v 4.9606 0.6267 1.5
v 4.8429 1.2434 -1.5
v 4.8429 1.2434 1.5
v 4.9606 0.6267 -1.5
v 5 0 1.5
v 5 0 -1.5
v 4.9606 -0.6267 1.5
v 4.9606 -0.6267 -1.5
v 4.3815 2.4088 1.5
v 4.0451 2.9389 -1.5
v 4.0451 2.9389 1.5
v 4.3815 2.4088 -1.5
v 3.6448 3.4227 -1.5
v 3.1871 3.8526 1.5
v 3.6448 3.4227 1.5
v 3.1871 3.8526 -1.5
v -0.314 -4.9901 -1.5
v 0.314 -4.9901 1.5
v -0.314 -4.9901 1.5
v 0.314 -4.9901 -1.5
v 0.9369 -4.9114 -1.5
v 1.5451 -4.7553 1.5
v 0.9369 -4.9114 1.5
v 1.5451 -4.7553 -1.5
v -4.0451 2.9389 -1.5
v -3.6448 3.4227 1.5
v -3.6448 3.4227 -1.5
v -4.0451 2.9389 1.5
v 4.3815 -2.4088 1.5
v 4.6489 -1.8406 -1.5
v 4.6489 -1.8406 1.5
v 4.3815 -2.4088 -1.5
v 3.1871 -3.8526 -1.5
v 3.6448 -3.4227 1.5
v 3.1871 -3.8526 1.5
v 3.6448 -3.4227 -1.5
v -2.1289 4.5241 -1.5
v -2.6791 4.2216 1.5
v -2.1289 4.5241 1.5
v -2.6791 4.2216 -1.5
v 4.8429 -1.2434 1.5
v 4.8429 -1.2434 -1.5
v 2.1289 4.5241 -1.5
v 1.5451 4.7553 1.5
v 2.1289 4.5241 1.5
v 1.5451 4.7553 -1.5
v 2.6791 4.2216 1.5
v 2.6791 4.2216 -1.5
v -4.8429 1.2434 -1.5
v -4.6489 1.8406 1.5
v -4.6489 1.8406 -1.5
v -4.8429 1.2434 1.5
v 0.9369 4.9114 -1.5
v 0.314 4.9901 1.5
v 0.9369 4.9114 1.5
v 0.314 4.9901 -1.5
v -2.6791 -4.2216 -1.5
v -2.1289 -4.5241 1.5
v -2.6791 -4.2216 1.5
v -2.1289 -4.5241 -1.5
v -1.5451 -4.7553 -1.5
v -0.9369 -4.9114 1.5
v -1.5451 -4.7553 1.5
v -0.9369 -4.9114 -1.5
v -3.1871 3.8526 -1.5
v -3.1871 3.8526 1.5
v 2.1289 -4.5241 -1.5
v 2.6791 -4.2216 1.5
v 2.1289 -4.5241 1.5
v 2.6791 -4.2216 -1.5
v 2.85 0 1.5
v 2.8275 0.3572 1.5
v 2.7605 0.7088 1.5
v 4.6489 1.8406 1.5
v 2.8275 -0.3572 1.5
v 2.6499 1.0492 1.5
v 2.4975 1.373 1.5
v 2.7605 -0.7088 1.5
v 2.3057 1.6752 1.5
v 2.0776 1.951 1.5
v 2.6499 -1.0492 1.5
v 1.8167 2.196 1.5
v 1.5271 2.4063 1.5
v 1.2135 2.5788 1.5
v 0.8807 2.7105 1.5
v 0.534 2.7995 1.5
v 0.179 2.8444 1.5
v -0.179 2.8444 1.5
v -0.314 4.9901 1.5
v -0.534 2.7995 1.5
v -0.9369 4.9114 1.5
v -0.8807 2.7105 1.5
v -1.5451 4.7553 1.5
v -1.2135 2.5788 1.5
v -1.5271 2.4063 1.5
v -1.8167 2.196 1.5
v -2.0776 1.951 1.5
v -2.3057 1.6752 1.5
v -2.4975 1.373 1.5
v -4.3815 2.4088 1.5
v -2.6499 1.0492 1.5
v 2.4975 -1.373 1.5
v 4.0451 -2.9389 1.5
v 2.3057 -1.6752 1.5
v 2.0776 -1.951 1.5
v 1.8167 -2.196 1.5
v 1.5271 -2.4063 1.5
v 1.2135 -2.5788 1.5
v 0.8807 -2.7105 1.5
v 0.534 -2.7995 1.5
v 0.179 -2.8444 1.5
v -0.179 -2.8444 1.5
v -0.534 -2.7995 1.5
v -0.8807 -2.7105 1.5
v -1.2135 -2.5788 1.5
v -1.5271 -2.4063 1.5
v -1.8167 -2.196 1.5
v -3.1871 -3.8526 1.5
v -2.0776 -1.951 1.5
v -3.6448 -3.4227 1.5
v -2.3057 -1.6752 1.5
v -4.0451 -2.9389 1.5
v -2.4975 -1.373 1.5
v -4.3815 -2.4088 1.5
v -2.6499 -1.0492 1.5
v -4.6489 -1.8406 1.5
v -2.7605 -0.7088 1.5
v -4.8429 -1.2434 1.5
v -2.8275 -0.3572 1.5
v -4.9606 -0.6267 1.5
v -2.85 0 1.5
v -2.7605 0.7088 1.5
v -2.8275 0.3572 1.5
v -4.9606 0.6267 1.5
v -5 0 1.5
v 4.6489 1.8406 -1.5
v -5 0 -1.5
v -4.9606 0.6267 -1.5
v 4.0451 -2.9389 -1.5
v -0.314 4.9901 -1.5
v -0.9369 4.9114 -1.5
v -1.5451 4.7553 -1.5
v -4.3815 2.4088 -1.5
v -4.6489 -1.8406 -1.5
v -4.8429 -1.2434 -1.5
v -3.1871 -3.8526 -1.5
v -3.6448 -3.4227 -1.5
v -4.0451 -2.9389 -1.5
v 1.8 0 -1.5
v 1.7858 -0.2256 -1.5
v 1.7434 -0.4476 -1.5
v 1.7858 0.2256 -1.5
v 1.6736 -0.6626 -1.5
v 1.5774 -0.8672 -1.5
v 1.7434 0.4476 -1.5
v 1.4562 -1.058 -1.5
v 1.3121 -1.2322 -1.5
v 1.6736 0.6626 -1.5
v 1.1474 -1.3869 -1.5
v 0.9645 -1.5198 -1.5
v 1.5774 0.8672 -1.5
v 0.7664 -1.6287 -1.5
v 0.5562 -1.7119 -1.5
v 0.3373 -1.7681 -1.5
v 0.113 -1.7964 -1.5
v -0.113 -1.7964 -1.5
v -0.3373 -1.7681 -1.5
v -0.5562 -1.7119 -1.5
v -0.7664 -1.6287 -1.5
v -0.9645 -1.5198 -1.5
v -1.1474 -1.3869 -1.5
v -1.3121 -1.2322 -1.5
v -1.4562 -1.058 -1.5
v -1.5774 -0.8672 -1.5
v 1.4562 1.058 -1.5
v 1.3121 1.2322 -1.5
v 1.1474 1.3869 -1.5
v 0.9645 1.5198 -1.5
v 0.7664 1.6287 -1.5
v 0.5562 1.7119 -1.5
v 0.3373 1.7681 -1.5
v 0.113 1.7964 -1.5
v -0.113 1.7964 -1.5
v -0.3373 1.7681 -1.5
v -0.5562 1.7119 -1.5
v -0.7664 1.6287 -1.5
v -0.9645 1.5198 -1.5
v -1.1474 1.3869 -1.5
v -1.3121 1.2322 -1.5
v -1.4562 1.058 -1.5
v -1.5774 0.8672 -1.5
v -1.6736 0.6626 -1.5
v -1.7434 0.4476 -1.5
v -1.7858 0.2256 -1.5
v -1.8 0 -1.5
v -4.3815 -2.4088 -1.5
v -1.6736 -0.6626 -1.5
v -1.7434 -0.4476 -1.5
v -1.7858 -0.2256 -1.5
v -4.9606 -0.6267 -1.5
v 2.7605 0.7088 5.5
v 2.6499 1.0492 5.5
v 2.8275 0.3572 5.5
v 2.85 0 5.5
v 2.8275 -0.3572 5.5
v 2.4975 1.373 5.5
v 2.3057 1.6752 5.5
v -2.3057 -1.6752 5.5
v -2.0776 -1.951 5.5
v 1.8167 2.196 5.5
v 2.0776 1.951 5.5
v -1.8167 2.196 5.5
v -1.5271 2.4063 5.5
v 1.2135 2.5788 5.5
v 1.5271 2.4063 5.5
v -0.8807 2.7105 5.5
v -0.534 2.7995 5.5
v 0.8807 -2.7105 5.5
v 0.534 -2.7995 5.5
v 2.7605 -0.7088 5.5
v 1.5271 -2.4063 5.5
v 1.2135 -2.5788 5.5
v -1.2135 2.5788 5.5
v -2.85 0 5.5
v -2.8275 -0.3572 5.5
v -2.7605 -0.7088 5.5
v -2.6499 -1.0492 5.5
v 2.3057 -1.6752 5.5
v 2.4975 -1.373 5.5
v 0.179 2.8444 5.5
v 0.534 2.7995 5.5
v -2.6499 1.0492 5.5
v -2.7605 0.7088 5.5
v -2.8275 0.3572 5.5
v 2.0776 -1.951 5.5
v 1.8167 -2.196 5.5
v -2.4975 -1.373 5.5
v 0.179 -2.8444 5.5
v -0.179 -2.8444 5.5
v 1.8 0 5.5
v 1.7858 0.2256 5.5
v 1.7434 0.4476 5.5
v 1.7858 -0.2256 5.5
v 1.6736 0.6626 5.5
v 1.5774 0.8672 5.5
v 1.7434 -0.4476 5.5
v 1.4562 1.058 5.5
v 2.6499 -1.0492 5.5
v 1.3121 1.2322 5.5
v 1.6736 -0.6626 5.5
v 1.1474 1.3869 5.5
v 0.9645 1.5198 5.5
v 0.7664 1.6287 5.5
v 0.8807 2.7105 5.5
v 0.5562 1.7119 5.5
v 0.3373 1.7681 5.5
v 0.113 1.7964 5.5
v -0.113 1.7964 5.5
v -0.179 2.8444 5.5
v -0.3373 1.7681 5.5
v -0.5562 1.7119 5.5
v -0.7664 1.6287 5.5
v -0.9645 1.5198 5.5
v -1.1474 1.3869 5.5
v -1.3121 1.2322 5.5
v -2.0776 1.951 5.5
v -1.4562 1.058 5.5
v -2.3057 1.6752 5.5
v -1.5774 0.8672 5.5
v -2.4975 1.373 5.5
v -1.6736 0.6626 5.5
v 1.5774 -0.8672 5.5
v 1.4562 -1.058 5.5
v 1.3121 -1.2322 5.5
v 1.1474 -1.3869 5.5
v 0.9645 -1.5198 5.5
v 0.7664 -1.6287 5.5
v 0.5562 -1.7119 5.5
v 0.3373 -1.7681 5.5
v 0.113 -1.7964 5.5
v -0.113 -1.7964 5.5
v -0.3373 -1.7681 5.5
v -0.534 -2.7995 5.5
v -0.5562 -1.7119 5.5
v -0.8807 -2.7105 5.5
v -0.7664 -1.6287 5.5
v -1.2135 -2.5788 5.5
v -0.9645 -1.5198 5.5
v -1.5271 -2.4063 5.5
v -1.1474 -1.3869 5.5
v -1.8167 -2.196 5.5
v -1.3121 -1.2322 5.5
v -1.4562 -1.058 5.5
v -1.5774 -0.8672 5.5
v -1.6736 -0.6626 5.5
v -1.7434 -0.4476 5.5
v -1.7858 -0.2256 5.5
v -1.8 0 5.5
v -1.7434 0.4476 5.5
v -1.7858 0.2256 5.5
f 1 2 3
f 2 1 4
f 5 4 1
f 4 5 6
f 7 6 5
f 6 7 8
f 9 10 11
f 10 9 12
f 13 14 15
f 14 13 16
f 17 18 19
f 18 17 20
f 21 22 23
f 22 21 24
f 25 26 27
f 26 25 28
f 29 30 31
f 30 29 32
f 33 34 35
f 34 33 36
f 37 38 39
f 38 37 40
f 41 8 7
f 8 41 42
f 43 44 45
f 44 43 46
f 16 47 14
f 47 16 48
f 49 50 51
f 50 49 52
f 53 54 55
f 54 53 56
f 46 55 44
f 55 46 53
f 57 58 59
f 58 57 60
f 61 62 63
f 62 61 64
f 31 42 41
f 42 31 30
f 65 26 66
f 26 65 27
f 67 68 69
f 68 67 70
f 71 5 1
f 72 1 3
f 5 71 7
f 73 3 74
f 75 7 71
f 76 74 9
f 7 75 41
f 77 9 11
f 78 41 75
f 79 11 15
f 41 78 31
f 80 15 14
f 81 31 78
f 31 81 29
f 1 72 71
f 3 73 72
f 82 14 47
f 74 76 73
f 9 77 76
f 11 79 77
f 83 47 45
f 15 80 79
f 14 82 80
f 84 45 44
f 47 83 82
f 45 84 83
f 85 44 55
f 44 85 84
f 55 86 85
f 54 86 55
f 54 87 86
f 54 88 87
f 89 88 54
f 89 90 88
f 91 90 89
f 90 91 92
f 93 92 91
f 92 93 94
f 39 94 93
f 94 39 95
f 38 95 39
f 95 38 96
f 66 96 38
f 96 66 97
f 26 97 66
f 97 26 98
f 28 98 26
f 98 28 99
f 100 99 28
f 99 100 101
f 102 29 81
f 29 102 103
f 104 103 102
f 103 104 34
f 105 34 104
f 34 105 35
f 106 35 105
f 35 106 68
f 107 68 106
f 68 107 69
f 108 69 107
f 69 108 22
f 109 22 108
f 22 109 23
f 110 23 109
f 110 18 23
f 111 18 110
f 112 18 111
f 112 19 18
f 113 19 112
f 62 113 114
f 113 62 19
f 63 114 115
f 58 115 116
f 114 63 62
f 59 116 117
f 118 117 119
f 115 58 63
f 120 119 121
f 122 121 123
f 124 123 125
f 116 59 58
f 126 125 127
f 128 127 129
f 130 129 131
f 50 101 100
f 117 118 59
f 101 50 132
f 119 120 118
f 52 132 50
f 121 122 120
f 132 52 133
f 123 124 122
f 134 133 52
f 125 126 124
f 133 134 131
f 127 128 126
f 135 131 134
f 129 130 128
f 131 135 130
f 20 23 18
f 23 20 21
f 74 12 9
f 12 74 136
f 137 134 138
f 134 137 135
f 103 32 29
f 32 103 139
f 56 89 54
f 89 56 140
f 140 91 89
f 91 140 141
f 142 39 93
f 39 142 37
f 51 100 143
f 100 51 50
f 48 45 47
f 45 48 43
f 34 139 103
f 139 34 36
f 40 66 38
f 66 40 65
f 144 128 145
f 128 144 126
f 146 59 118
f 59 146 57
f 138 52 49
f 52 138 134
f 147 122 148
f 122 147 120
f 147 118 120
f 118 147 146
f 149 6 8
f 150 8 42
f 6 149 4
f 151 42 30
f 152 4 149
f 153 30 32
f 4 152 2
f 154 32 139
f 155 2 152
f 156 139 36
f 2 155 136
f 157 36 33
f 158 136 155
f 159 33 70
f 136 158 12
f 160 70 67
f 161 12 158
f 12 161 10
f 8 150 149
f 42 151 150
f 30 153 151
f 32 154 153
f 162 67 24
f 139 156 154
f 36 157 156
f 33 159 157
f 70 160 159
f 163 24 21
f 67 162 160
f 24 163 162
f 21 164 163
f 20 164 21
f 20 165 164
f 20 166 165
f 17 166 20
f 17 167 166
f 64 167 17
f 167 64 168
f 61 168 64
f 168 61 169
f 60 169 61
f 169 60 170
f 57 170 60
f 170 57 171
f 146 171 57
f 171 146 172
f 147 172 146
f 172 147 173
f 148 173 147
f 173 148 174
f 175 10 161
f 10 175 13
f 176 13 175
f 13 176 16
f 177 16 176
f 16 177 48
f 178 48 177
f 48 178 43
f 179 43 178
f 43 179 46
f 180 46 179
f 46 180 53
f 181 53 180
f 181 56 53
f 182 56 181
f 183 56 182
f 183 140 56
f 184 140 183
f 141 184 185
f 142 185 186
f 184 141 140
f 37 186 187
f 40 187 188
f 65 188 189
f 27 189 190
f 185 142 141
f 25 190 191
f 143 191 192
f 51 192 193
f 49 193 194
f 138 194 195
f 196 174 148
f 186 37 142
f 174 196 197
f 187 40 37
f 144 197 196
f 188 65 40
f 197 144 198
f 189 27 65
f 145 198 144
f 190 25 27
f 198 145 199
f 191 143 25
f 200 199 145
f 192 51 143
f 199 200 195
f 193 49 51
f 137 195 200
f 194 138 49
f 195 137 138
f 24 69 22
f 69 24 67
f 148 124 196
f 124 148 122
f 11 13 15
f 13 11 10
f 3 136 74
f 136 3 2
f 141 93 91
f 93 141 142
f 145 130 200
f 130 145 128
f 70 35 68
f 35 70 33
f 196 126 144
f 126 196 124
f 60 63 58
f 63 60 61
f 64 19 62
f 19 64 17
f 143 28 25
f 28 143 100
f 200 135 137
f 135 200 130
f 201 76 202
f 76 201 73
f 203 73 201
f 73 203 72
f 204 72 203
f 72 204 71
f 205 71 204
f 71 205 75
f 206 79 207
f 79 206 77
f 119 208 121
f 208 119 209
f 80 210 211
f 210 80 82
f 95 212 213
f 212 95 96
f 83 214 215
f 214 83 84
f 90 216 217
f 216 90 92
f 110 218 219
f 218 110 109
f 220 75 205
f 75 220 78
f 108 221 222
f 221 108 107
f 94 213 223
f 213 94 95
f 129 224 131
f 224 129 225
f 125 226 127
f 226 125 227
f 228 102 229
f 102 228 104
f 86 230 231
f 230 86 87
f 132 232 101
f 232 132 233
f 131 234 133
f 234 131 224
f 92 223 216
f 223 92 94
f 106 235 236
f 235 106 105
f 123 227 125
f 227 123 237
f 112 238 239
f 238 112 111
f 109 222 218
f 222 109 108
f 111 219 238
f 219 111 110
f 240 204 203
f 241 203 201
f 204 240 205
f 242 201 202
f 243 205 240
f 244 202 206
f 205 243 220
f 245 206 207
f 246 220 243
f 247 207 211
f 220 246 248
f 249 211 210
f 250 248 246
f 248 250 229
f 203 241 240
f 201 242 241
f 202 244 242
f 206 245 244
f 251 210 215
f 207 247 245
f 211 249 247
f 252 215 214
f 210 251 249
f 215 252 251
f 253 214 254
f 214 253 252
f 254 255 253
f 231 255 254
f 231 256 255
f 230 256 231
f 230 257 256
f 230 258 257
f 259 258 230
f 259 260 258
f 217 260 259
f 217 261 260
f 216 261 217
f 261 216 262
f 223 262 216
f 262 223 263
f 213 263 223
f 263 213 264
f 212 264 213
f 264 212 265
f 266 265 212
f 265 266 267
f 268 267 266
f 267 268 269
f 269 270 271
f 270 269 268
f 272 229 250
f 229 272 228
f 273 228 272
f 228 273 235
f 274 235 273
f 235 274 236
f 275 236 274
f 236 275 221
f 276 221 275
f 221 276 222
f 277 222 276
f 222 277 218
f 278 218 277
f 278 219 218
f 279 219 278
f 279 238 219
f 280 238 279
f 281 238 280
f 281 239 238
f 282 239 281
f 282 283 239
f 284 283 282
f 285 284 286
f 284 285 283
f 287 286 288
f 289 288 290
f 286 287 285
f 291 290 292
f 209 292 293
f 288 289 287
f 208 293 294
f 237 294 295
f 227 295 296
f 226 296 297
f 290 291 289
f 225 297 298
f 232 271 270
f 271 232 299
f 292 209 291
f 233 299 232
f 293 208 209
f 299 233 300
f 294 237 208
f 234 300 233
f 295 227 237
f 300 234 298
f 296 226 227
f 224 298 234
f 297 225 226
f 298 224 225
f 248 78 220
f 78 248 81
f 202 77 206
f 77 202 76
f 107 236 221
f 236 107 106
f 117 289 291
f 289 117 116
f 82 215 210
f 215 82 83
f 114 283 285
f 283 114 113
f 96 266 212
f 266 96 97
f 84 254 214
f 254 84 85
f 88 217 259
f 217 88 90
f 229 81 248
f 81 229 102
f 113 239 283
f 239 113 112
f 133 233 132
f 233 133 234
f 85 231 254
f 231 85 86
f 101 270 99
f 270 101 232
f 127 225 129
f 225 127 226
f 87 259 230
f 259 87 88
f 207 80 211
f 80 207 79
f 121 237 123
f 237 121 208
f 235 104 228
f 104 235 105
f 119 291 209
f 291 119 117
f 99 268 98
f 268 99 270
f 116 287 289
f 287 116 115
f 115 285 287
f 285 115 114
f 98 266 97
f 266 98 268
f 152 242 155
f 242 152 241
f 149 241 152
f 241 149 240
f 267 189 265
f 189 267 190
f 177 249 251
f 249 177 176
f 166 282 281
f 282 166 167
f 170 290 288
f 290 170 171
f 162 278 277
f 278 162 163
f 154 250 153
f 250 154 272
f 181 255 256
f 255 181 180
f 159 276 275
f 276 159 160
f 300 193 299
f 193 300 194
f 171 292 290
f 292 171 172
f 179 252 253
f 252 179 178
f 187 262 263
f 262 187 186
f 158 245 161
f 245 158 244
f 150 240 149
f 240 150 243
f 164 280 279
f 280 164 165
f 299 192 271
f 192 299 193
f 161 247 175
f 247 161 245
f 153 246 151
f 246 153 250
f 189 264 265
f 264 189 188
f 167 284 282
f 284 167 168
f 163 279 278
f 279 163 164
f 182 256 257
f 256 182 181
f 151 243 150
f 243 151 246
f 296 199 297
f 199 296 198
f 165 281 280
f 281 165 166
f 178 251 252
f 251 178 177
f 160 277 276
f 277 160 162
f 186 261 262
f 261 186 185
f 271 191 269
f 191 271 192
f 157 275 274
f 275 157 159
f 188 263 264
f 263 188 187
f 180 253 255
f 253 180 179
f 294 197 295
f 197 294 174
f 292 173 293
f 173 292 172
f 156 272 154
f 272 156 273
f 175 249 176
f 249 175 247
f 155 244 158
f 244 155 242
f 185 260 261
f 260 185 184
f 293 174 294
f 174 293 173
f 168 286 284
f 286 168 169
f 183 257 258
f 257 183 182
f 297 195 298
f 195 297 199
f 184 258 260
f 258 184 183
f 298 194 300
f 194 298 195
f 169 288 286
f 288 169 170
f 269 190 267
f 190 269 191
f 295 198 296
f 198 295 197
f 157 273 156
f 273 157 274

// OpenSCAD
$fn = 50;


difference() {
	union() {
		translate(v = [0, 0, -1.5000000000]) {
			cylinder(h = 3, r = 5.0000000000);
		}
		translate(v = [0, 0, -1.5000000000]) {
			cylinder(h = 7, r = 2.8500000000);
		}
	}
	union() {
		translate(v = [0, 0, -100.0000000000]) {
			cylinder(h = 200, r = 1.8000000000);
		}
	}
}
